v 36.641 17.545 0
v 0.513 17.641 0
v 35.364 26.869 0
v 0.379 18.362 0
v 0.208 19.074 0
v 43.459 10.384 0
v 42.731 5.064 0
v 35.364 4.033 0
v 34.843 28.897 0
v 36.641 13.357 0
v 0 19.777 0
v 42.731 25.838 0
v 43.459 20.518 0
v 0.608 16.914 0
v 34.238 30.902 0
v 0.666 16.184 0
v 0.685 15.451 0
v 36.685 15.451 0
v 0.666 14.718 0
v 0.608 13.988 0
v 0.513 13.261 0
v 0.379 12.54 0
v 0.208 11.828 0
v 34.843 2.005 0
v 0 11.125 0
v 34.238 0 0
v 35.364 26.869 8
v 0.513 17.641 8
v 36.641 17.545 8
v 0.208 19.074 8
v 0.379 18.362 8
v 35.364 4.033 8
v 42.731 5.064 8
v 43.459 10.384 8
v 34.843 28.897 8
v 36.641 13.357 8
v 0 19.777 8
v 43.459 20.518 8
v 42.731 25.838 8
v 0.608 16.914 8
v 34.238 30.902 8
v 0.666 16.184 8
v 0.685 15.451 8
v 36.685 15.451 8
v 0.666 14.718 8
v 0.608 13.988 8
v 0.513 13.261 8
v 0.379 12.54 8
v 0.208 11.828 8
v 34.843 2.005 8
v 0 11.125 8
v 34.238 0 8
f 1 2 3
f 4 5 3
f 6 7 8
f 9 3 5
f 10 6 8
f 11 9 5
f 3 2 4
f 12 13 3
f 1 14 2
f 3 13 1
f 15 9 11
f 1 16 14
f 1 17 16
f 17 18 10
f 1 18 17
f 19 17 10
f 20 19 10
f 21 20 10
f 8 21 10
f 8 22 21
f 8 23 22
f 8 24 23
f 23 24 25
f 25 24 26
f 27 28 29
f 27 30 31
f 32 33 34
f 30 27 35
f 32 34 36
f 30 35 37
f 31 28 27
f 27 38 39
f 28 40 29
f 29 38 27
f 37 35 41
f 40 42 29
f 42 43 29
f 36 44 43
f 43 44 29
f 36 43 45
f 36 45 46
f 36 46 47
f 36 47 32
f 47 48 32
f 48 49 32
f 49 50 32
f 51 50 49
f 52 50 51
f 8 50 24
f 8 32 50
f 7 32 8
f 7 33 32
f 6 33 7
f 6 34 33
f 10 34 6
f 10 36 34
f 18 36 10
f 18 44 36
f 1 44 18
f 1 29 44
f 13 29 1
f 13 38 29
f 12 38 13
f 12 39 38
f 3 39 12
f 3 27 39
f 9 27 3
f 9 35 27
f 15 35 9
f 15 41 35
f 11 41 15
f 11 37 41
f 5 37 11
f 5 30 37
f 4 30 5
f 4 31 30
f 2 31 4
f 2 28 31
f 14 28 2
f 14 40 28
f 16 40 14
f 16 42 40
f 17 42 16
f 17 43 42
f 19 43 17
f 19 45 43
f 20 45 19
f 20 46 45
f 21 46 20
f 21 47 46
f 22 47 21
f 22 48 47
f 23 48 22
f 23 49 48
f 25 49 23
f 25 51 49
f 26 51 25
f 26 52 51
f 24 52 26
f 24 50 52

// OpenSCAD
$fn = 32;

// ----------------------------------------------------------------------
// Gear sector: 2 teeth on 36 degrees
// ----------------------------------------------------------------------

// --- parameters (mm) ---
sector_angle = 36;        // sector angle, degrees
root_r = 50;              // root circle radius
tooth_h = 7;              // tooth height over the root circle
teeth = 2;                // number of teeth on the sector
hub_r = 14;               // hub bore radius
plate_t = 8;              // sector thickness, Z
arc_step = 3;             // sampling step of the root/hub arcs, degrees

tip_r = root_r + tooth_h;  // tip circle radius

profile = [[34.238, 0], [34.843, 2.005], [35.364, 4.033], [42.731, 5.064], [43.459, 10.384], [36.641, 13.357], [36.685, 15.451], [36.641, 17.545], [43.459, 20.518], [42.731, 25.838], [35.364, 26.869], [34.843, 28.897], [34.238, 30.902], [0, 19.777], [0.208, 19.074], [0.379, 18.362], [0.513, 17.641], [0.608, 16.914], [0.666, 16.184], [0.685, 15.451], [0.666, 14.718], [0.608, 13.988], [0.513, 13.261], [0.379, 12.54], [0.208, 11.828], [0, 11.125]];  // primary outline, 26 points, counter clockwise

// --- the one profile operation ---
linear_extrude(height = plate_t) polygon(points = profile);
